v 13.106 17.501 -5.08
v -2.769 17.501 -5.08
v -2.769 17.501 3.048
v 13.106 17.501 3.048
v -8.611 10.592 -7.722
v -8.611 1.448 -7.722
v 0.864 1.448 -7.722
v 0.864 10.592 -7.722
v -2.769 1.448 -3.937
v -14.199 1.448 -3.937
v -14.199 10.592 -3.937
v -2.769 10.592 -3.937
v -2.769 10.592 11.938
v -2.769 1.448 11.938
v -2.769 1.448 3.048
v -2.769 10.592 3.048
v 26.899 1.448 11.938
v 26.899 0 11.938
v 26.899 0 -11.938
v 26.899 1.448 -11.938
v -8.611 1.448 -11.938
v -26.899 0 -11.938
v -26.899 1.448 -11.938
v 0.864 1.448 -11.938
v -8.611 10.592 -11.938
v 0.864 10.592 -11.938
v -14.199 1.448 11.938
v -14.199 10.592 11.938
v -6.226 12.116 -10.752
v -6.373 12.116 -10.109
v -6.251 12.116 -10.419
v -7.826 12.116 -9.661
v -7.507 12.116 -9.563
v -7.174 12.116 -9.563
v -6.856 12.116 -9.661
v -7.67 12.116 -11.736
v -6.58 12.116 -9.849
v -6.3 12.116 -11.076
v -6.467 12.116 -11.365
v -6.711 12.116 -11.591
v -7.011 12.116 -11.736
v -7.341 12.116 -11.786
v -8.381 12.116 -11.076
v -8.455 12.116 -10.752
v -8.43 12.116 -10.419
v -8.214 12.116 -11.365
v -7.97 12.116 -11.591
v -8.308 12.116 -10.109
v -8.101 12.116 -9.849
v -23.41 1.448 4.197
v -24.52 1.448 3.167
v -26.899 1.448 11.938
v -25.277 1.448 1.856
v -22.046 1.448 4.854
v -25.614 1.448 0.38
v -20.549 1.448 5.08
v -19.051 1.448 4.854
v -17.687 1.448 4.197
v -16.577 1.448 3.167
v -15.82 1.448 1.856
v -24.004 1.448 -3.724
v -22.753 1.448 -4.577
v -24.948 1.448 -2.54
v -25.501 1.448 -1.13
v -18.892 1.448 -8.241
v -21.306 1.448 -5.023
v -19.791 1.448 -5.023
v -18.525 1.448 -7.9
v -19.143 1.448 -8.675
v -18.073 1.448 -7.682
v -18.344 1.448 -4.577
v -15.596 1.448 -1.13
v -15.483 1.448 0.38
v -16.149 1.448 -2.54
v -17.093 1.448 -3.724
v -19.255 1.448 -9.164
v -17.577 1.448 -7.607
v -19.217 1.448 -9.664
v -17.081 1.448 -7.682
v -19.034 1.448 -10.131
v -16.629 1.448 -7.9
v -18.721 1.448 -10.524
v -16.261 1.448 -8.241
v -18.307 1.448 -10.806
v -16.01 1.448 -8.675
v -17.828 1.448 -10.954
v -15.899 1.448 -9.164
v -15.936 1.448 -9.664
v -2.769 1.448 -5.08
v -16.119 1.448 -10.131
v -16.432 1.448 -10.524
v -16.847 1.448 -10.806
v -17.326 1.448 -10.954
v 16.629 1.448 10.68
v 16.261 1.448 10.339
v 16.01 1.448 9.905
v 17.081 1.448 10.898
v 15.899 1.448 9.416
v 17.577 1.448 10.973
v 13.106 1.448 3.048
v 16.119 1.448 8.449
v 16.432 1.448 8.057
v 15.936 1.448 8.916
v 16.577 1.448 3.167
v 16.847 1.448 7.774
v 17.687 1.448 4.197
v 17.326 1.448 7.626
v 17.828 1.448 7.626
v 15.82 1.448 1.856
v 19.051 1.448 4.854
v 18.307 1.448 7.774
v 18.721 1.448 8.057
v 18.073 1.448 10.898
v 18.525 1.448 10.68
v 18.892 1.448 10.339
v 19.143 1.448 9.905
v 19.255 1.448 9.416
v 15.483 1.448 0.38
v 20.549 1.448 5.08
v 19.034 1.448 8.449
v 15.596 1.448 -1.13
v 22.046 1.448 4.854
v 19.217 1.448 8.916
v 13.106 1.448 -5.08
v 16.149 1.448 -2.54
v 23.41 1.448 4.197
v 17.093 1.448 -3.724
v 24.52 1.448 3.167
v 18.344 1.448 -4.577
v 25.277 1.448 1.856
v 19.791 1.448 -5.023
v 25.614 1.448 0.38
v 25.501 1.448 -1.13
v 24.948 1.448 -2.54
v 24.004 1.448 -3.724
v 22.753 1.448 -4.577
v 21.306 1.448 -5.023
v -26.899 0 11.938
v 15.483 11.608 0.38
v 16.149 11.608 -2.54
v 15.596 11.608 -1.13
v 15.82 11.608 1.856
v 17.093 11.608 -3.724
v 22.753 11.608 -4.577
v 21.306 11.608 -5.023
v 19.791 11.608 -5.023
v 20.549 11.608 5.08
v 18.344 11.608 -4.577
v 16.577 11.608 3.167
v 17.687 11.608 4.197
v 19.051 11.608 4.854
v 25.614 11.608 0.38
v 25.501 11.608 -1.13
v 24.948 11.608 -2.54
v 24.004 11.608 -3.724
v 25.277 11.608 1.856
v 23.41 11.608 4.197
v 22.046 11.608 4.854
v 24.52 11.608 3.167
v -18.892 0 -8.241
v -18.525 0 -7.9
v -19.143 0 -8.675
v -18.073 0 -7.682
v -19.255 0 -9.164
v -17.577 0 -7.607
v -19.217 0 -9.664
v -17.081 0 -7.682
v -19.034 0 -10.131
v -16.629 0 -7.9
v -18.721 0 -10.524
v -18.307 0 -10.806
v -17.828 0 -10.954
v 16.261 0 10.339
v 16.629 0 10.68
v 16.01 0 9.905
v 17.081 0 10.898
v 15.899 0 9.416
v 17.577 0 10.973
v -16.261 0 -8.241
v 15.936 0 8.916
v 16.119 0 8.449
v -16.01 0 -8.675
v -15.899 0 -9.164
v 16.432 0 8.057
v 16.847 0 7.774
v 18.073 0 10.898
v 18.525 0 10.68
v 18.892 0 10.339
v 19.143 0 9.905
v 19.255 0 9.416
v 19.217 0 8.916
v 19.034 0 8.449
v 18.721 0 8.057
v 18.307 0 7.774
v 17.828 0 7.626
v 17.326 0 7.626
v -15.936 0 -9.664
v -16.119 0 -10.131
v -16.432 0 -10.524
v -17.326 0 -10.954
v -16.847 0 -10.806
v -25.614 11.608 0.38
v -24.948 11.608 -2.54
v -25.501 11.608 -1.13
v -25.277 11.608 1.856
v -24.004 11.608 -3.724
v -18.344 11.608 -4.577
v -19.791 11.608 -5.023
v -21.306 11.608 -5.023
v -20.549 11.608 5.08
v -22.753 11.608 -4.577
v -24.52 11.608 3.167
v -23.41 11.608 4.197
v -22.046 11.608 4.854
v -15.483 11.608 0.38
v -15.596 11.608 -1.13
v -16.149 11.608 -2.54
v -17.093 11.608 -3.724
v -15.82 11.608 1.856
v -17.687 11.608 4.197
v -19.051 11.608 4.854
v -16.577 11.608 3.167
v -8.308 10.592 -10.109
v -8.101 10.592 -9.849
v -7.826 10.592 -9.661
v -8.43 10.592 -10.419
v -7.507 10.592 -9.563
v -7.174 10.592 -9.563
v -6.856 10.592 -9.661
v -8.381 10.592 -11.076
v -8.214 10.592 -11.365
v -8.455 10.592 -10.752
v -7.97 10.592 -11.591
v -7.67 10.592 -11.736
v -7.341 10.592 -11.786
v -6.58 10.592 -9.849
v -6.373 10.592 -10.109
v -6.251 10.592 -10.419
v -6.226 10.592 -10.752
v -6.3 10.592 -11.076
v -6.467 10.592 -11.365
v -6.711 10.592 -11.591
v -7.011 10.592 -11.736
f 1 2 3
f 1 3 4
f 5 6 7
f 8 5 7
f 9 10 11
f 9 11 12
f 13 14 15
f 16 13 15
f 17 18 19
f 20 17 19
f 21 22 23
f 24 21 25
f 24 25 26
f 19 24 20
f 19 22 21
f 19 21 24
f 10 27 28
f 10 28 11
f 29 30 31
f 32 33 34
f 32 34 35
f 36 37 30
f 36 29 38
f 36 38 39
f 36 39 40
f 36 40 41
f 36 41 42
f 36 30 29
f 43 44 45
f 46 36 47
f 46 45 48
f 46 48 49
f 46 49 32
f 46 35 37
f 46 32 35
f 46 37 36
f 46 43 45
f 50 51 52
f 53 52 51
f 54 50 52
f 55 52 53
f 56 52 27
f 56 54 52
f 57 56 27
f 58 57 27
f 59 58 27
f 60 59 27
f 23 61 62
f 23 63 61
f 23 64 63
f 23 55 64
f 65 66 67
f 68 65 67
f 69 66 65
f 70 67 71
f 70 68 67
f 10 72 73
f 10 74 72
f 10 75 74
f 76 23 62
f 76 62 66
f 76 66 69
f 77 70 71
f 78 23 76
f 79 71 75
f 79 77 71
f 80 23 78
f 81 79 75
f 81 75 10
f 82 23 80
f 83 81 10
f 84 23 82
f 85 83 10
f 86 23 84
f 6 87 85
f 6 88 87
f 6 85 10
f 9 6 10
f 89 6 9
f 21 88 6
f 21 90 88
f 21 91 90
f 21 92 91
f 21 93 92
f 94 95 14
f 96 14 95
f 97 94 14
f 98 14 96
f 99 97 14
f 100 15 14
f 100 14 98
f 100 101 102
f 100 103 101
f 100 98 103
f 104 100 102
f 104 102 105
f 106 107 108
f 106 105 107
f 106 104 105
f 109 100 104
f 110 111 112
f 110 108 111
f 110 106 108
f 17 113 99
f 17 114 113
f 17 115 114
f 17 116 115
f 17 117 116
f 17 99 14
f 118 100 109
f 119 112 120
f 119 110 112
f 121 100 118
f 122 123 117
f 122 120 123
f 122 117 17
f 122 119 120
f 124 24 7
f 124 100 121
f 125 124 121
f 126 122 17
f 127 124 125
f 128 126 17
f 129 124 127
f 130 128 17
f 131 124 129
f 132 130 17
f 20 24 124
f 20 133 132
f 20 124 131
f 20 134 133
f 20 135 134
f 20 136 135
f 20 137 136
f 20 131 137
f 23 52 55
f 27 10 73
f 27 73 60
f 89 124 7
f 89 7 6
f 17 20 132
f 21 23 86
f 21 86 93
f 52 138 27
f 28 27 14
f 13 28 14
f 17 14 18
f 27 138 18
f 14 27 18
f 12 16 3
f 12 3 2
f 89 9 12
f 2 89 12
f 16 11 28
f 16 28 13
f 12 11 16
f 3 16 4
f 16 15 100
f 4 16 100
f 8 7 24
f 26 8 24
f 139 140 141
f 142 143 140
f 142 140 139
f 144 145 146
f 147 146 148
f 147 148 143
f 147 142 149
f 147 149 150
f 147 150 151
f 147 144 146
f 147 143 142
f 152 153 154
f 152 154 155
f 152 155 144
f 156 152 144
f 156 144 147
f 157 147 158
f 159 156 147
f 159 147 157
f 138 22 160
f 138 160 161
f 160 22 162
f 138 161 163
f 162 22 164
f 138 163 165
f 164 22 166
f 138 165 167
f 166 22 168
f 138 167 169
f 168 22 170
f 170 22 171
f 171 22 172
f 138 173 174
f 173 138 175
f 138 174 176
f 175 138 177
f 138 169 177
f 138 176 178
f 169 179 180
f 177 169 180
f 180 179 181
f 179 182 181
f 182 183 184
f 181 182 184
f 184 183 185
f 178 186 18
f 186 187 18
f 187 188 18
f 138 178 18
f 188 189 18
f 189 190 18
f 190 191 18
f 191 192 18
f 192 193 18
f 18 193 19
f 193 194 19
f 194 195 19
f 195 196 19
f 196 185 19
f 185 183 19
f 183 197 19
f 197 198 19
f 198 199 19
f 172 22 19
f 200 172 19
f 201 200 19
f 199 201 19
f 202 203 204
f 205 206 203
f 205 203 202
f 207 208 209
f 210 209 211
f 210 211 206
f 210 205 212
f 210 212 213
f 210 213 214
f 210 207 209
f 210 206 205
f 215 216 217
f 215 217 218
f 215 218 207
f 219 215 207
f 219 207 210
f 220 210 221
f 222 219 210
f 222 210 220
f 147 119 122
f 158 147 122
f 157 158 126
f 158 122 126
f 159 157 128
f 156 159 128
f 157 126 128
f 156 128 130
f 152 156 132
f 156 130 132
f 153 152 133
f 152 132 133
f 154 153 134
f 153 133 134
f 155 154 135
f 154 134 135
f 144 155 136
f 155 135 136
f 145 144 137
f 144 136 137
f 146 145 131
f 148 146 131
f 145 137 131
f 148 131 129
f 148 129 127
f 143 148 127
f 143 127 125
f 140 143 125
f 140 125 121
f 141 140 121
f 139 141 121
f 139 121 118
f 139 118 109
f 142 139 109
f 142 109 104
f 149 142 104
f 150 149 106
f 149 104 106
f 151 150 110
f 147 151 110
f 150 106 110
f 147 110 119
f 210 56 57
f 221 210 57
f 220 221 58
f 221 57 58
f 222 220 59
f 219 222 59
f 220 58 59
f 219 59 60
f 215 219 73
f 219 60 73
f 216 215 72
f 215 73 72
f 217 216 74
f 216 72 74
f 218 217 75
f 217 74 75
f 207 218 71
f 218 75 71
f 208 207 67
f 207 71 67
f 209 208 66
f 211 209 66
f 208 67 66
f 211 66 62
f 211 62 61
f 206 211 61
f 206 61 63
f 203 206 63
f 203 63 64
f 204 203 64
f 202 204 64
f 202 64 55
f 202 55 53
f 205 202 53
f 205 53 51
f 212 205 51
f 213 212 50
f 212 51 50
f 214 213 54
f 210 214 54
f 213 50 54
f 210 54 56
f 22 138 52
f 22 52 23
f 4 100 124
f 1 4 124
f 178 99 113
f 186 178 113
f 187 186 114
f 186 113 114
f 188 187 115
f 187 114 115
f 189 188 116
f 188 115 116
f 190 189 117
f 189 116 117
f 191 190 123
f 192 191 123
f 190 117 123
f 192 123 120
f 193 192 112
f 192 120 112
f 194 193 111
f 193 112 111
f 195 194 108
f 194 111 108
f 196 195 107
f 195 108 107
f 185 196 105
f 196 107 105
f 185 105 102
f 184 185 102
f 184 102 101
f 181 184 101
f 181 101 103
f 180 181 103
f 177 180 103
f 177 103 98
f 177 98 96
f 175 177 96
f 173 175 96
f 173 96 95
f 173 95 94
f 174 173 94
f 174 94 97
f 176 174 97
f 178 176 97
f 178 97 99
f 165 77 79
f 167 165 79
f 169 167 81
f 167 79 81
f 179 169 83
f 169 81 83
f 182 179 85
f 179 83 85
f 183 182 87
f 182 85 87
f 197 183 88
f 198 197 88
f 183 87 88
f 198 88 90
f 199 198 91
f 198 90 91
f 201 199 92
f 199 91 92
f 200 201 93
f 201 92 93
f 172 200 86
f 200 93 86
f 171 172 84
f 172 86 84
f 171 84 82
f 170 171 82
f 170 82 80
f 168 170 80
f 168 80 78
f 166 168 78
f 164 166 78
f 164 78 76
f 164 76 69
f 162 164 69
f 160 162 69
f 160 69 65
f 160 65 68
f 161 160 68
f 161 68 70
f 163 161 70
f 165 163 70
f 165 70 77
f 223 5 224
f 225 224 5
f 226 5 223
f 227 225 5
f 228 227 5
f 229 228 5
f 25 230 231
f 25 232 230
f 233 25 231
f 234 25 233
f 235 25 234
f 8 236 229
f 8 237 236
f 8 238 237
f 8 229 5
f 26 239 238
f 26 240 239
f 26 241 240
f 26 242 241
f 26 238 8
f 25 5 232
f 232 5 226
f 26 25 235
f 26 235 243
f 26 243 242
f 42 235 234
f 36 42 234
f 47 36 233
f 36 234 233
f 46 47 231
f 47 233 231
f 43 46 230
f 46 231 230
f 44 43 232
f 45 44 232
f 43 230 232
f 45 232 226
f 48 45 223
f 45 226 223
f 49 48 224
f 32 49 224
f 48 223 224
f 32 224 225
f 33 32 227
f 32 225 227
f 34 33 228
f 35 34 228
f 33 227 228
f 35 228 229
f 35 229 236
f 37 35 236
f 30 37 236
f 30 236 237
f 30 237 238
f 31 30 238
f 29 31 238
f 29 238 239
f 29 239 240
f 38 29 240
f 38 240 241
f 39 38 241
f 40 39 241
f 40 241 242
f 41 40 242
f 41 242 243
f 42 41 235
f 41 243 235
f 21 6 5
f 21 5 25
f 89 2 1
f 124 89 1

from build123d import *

# Parameters (mm, degrees)
SKETCH1_W           = 53.7972
SKETCH1_H           = 23.876
BOSS_EXTRUDE1_DEPTH = 1.4478
SKETCH2_R           = 1.68275
CUT_EXTRUDE1_DEPTH  = 30.464328446
SKETCH3_R           = 5.08
BOSS_EXTRUDE2_DEPTH = 10.16
SKETCH4_W           = 11.43
SKETCH4_H           = 15.875
BOSS_EXTRUDE3_DEPTH = 9.144
SKETCH5_W           = 9.4742
SKETCH5_H           = 4.2164
BOSS_EXTRUDE4_DEPTH = 9.144
SKETCH6_R           = 1.1176
BOSS_EXTRUDE5_DEPTH = 1.524
SKETCH7_W           = 15.875
SKETCH7_H           = 8.128
BOSS_EXTRUDE6_DEPTH = 16.0528


with BuildPart() as part:
    # Sketch1 → Boss-Extrude1 (new body)
    with BuildSketch(Plane(origin=(0, 0, 0), x_dir=(1, 0, 0), z_dir=(0, 1, 0))):
        Rectangle(SKETCH1_W, SKETCH1_H)
    extrude(amount=BOSS_EXTRUDE1_DEPTH)

    # Sketch2 → Cut-Extrude1 (cut, through all)
    with BuildSketch(Plane(origin=(0, 1.4478, 0), x_dir=(1, 0, 0), z_dir=(0, 1, 0))):
        with Locations(Location((17.5768, -9.29005, 0), (0, 0, 270))):
            Circle(SKETCH2_R)
        with Locations(Location((-17.5768, 9.29005, 0), (0, 0, 270))):
            Circle(SKETCH2_R)
    extrude(amount=-CUT_EXTRUDE1_DEPTH, mode=Mode.SUBTRACT)

    # Sketch3 → Boss-Extrude2 (add)
    with BuildSketch(Plane(origin=(0, 1.4478, 0), x_dir=(1, 0, 0), z_dir=(0, 1, 0))):
        with Locations(Location((20.5486, 0, 0), (0, 0, 270))):
            Circle(SKETCH3_R)
        with Locations(Location((-20.5486, 0, 0), (0, 0, 270))):
            Circle(SKETCH3_R)
    extrude(amount=BOSS_EXTRUDE2_DEPTH)

    # Sketch4 → Boss-Extrude3 (add)
    with BuildSketch(Plane(origin=(0, 1.4478, 0), x_dir=(1, 0, 0), z_dir=(0, 1, 0))):
        with Locations((-8.4836, -4.0005)):
            Rectangle(SKETCH4_W, SKETCH4_H)
    extrude(amount=BOSS_EXTRUDE3_DEPTH)

    # Sketch5 → Boss-Extrude4 (add)
    with BuildSketch(Plane(origin=(0, 1.4478, 0), x_dir=(1, 0, 0), z_dir=(0, 1, 0))):
        with Locations((-3.8735, 9.8298)):
            Rectangle(SKETCH5_W, SKETCH5_H)
    extrude(amount=BOSS_EXTRUDE4_DEPTH)

    # Sketch6 → Boss-Extrude5 (add)
    with BuildSketch(Plane(origin=(0, 10.5918, 0), x_dir=(1, 0, 0), z_dir=(0, 1, 0))):
        with Locations(Location((-7.3406, 10.668, 0), (0, 0, 90))):
            Circle(SKETCH6_R)
    extrude(amount=BOSS_EXTRUDE5_DEPTH)

    # Sketch7 → Boss-Extrude6 (add)
    with BuildSketch(Plane(origin=(0, 1.4478, 0), x_dir=(1, 0, 0), z_dir=(0, 1, 0))):
        with Locations((5.1689, 1.016)):
            Rectangle(SKETCH7_W, SKETCH7_H)
    extrude(amount=BOSS_EXTRUDE6_DEPTH)


solid = part.part
